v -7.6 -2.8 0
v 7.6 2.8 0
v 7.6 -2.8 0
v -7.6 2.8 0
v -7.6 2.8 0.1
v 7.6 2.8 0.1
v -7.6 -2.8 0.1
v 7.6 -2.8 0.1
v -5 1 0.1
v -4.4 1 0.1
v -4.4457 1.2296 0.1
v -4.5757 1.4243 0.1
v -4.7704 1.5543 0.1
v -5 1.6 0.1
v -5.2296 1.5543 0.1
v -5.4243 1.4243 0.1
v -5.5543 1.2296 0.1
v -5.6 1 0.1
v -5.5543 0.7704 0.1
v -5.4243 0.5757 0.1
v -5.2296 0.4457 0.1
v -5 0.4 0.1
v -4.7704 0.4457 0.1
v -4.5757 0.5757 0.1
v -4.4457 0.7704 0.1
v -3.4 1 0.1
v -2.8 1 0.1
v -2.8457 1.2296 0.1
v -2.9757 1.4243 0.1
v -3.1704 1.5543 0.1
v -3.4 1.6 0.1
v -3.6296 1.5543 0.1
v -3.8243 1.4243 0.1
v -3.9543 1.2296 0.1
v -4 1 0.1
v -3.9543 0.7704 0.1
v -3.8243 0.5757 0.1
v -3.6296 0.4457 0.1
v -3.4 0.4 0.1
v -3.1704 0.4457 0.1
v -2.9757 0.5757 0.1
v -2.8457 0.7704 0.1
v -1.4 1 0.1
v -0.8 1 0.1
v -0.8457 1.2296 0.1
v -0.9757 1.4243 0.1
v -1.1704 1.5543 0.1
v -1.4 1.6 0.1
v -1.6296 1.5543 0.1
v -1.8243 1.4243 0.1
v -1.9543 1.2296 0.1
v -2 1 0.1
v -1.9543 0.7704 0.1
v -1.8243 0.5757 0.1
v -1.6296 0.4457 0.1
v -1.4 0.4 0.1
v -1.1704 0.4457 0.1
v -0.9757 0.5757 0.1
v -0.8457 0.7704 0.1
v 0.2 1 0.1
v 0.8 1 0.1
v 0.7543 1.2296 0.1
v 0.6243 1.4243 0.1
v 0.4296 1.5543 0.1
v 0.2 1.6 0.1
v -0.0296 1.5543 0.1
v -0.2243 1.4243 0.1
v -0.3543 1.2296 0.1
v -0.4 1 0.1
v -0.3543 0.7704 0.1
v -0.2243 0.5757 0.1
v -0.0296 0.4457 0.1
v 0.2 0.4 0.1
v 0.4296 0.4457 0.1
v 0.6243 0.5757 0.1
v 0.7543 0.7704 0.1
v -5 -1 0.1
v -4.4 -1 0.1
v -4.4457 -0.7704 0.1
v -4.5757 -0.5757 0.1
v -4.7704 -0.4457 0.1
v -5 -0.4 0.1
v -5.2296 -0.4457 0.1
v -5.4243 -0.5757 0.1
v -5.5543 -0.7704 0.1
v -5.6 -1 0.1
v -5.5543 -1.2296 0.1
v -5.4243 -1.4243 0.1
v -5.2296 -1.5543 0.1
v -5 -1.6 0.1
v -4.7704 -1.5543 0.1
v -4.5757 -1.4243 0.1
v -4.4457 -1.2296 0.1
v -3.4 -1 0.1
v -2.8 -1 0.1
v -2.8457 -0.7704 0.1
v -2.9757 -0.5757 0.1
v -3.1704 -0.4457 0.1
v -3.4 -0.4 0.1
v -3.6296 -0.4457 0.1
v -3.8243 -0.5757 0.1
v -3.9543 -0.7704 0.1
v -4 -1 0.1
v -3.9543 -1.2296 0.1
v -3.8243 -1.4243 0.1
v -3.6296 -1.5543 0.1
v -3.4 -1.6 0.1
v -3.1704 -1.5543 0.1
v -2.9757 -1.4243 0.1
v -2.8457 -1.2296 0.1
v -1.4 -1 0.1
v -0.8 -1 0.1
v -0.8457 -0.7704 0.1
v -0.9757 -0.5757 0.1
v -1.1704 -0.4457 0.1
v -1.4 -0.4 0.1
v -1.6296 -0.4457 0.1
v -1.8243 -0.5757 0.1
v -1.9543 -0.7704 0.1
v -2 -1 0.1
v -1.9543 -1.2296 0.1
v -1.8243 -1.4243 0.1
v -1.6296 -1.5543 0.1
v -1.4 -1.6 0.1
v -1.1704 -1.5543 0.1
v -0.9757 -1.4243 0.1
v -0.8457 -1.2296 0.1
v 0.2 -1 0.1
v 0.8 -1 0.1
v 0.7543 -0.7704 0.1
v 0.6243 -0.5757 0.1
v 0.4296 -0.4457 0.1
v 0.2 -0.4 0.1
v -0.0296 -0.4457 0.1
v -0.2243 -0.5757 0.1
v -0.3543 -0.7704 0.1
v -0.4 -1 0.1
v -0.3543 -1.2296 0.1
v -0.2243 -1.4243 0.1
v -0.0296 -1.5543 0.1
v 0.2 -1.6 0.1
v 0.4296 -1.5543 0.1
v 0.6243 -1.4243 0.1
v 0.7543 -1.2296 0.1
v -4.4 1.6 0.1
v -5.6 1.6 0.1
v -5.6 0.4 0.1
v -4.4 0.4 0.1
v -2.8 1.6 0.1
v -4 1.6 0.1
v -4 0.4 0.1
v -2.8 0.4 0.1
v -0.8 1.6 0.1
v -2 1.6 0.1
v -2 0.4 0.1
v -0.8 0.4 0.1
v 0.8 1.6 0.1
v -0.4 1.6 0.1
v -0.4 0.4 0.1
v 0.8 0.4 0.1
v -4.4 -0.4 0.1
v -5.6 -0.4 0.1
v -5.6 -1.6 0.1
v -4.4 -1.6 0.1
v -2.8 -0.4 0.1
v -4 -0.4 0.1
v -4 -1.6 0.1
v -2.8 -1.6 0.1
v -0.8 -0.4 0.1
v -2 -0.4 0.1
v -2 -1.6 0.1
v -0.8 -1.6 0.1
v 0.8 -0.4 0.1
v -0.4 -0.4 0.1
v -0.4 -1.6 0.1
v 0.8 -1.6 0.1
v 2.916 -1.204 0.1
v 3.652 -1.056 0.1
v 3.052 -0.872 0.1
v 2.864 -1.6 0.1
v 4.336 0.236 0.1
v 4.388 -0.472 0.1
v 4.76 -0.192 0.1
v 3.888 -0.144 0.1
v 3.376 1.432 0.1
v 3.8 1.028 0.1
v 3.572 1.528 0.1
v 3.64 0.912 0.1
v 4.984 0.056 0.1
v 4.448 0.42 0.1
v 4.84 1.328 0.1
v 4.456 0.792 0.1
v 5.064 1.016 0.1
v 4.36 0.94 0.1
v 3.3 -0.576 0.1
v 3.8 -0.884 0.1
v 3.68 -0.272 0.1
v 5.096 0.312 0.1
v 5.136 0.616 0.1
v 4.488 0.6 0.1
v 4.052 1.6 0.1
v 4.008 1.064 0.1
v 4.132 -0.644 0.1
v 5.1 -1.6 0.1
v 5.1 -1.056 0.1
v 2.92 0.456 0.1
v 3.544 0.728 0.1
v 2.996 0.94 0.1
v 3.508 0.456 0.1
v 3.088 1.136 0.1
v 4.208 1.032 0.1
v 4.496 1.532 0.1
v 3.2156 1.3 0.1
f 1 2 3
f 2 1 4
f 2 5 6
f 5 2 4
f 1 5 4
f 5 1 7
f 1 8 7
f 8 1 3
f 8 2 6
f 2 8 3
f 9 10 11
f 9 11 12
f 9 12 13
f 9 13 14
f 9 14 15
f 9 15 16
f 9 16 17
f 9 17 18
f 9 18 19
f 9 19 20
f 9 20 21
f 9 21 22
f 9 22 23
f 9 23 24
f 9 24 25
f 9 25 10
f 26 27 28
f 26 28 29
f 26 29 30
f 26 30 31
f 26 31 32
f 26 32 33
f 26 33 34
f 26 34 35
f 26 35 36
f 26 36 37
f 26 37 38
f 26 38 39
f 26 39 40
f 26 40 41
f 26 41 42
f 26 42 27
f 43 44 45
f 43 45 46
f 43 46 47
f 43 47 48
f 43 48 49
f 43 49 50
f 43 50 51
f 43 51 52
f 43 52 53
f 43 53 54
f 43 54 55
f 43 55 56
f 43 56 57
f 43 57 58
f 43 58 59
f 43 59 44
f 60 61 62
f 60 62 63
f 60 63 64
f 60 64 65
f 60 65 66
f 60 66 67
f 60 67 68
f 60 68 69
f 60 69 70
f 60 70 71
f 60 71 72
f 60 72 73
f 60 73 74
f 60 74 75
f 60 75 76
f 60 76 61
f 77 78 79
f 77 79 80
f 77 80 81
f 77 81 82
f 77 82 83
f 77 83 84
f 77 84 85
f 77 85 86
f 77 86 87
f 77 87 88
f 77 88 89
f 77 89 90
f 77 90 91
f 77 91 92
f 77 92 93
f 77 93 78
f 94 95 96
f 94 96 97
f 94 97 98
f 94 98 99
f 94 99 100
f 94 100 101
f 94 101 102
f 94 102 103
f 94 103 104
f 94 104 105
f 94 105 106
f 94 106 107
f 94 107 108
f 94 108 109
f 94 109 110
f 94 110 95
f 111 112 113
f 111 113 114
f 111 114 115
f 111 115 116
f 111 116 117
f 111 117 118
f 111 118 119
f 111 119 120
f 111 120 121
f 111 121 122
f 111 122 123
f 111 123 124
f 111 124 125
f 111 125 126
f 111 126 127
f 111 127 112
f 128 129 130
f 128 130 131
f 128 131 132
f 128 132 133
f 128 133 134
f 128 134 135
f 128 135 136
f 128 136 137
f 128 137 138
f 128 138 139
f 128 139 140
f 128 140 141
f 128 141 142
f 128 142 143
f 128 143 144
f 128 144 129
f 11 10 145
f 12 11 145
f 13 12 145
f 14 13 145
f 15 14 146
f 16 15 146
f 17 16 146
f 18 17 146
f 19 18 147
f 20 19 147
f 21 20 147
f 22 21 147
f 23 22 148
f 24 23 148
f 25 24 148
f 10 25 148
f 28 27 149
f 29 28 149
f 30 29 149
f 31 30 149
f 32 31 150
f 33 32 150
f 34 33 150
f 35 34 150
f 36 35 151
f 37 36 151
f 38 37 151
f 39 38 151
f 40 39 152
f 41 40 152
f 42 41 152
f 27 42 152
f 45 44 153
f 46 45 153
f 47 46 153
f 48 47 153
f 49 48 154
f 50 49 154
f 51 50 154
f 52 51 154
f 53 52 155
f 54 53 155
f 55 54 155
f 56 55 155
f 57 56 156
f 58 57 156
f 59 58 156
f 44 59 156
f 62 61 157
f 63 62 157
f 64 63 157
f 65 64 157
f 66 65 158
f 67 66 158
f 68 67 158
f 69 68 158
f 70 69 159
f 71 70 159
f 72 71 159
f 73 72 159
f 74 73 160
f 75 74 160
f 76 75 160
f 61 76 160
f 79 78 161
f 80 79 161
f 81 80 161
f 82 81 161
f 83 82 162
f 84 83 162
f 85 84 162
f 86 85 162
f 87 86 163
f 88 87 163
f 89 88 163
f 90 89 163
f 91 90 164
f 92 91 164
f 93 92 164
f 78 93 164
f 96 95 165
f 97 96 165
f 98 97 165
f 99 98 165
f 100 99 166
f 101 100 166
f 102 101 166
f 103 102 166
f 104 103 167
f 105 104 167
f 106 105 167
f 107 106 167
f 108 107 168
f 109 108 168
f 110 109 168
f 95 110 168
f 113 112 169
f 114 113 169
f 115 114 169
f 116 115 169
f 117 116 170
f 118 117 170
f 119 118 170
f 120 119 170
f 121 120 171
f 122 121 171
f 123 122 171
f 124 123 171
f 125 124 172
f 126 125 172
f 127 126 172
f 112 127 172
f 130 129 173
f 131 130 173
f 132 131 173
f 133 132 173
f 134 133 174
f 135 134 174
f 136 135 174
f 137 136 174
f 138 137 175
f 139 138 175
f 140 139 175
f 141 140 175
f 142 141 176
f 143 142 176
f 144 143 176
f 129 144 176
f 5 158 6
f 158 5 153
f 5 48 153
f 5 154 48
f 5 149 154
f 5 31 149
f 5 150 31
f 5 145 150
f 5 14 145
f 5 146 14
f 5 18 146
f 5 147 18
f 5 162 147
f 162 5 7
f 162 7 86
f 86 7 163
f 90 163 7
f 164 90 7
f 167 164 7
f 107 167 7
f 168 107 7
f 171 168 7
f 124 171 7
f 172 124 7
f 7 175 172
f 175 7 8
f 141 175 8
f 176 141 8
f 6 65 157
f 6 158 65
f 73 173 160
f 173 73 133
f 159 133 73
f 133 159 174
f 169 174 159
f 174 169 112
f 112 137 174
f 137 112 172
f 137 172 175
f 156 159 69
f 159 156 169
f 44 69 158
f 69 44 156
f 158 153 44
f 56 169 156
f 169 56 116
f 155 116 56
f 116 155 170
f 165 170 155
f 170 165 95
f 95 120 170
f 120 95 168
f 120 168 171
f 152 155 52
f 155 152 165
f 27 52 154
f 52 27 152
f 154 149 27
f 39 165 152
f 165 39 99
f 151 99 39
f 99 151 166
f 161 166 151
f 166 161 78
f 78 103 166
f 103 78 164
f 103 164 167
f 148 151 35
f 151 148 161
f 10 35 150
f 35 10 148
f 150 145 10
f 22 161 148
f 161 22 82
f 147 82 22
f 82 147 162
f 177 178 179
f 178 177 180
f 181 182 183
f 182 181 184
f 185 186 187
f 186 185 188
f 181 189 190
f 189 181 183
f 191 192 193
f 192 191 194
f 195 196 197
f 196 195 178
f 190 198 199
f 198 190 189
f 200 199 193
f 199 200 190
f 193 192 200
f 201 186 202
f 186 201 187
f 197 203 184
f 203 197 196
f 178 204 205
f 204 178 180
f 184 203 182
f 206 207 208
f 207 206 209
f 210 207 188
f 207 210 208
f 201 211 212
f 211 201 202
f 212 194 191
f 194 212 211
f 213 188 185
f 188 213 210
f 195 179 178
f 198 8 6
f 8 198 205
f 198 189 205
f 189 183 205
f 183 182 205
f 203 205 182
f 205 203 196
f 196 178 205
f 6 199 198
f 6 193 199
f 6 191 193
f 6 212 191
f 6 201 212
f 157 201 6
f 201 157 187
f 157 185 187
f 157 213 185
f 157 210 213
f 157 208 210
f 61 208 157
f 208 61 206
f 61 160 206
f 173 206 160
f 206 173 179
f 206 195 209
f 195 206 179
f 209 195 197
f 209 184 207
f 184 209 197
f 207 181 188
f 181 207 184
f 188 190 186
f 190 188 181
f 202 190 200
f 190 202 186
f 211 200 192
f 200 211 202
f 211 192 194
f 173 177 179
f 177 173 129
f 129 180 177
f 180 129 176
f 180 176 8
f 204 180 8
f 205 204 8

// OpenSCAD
// file: ../p/box5-12.scad
use <../lib.scad>
function ldraw_lib__box5_12() = [
// 0 Box with 5 Faces without Any Edges
// 0 Name: box5-12.dat
// 0 Author: Chris Dee [cwdee]
// 0 !LDRAW_ORG Primitive UPDATE 2009-02
// 0 !LICENSE Licensed under CC BY 4.0 : see CAreadme.txt
// 
// 0 BFC CERTIFY CCW
  [0,"BFC","CERTIFY"],
  [0,"BFC","CCW"],
// 
// 0 !HISTORY 2009-09-03 [PTadmin] Official Update 2009-02
// 
// 
// 4 16 1 1 1 1 1 -1 -1 1 -1 -1 1 1
  [4,16,1,1,1,1,1,-1,-1,1,-1,-1,1,1],
// 4 16 -1 0 1 1 0 1 1 1 1 -1 1 1
  [4,16,-1,0,1,1,0,1,1,1,1,-1,1,1],
// 4 16 -1 0 -1 -1 0 1 -1 1 1 -1 1 -1
  [4,16,-1,0,-1,-1,0,1,-1,1,1,-1,1,-1],
// 4 16 1 0 -1 -1 0 -1 -1 1 -1 1 1 -1
  [4,16,1,0,-1,-1,0,-1,-1,1,-1,1,1,-1],
// 4 16 1 0 1 1 0 -1 1 1 -1 1 1 1
  [4,16,1,0,1,1,0,-1,1,1,-1,1,1,1],
// 0
];
module ldraw_lib__box5_12(step=0, col=false, unit=2/5, alt=false, line=0.2, solid=!$preview)
    makepoly(ldraw_lib__box5_12(), step=step, col=col, unit=unit, alt=alt, line=line, solid=solid);
ldraw_lib__box5_12(line=0.2);
// file: ../p/4-4ndis.scad
use <../lib.scad>
function ldraw_lib__4_4ndis() = [
// 0 Disc Negative 1.0
// 0 Name: 4-4ndis.dat
// 0 Author: James Jessiman
// 0 !LDRAW_ORG Primitive UPDATE 2012-01
// 0 !LICENSE Licensed under CC BY 4.0 : see CAreadme.txt
// 
// 0 BFC CERTIFY CCW
  [0,"BFC","CERTIFY"],
  [0,"BFC","CCW"],
// 
// 0 !HISTORY 2002-03-23 [sbliss] Added BFC statement; compacted code
// 0 !HISTORY 2002-04-25 [PTadmin] Official Update 2002-02
// 0 !HISTORY 2007-06-24 [PTadmin] Header formatted for Contributor Agreement
// 0 !HISTORY 2008-07-01 [PTadmin] Official Update 2008-01
// 0 !HISTORY 2012-02-16 [Philo] Changed to CCW
// 0 !HISTORY 2012-03-30 [PTadmin] Official Update 2012-01
// 
// 
// 3 16 0.9239 0 0.3827 1 0 0 1 0 1
  [3,16,0.9239,0,0.3827,1,0,0,1,0,1],
// 3 16 0.7071 0 0.7071 0.9239 0 0.3827 1 0 1
  [3,16,0.7071,0,0.7071,0.9239,0,0.3827,1,0,1],
// 3 16 0.3827 0 0.9239 0.7071 0 0.7071 1 0 1
  [3,16,0.3827,0,0.9239,0.7071,0,0.7071,1,0,1],
// 3 16 0 0 1 0.3827 0 0.9239 1 0 1
  [3,16,0,0,1,0.3827,0,0.9239,1,0,1],
// 3 16 -0.3827 0 0.9239 0 0 1 -1 0 1
  [3,16,-0.3827,0,0.9239,0,0,1,-1,0,1],
// 3 16 -0.7071 0 0.7071 -0.3827 0 0.9239 -1 0 1
  [3,16,-0.7071,0,0.7071,-0.3827,0,0.9239,-1,0,1],
// 3 16 -0.9239 0 0.3827 -0.7071 0 0.7071 -1 0 1
  [3,16,-0.9239,0,0.3827,-0.7071,0,0.7071,-1,0,1],
// 3 16 -1 0 0 -0.9239 0 0.3827 -1 0 1
  [3,16,-1,0,0,-0.9239,0,0.3827,-1,0,1],
// 3 16 -0.9239 0 -0.3827 -1 0 0 -1 0 -1
  [3,16,-0.9239,0,-0.3827,-1,0,0,-1,0,-1],
// 3 16 -0.7071 0 -0.7071 -0.9239 0 -0.3827 -1 0 -1
  [3,16,-0.7071,0,-0.7071,-0.9239,0,-0.3827,-1,0,-1],
// 3 16 -0.3827 0 -0.9239 -0.7071 0 -0.7071 -1 0 -1
  [3,16,-0.3827,0,-0.9239,-0.7071,0,-0.7071,-1,0,-1],
// 3 16 0 0 -1 -0.3827 0 -0.9239 -1 0 -1
  [3,16,0,0,-1,-0.3827,0,-0.9239,-1,0,-1],
// 3 16 0.3827 0 -0.9239 0 0 -1 1 0 -1
  [3,16,0.3827,0,-0.9239,0,0,-1,1,0,-1],
// 3 16 0.7071 0 -0.7071 0.3827 0 -0.9239 1 0 -1
  [3,16,0.7071,0,-0.7071,0.3827,0,-0.9239,1,0,-1],
// 3 16 0.9239 0 -0.3827 0.7071 0 -0.7071 1 0 -1
  [3,16,0.9239,0,-0.3827,0.7071,0,-0.7071,1,0,-1],
// 3 16 1 0 0 0.9239 0 -0.3827 1 0 -1
  [3,16,1,0,0,0.9239,0,-0.3827,1,0,-1],
];
module ldraw_lib__4_4ndis(step=0, col=false, unit=2/5, alt=false, line=0.2, solid=!$preview)
    makepoly(ldraw_lib__4_4ndis(), step=step, col=col, unit=unit, alt=alt, line=line, solid=solid);
ldraw_lib__4_4ndis(line=0.2);
// file: ../p/4-4disc.scad
use <../lib.scad>
function ldraw_lib__4_4disc() = [
// 0 Disc 1.0
// 0 Name: 4-4disc.dat
// 0 Author: James Jessiman
// 0 !LDRAW_ORG Primitive UPDATE 2002-02
// 0 !LICENSE Licensed under CC BY 4.0 : see CAreadme.txt
// 
// 0 BFC CERTIFY CCW
  [0,"BFC","CERTIFY"],
  [0,"BFC","CCW"],
// 
// 0 !HISTORY 1998-12-15 [PTadmin] Official Update 1998-10
// 0 !HISTORY 2002-03-23 [sbliss] Added BFC statement
// 0 !HISTORY 2002-04-25 [PTadmin] Official Update 2002-02
// 0 !HISTORY 2007-06-24 [PTadmin] Header formatted for Contributor Agreement
// 0 !HISTORY 2008-07-01 [PTadmin] Official Update 2008-01
// 
// 
// 3 16 0 0 0 1 0 0 0.9239 0 0.3827
  [3,16,0,0,0,1,0,0,0.9239,0,0.3827],
// 3 16 0 0 0 0.9239 0 0.3827 0.7071 0 0.7071
  [3,16,0,0,0,0.9239,0,0.3827,0.7071,0,0.7071],
// 3 16 0 0 0 0.7071 0 0.7071 0.3827 0 0.9239
  [3,16,0,0,0,0.7071,0,0.7071,0.3827,0,0.9239],
// 3 16 0 0 0 0.3827 0 0.9239 0 0 1
  [3,16,0,0,0,0.3827,0,0.9239,0,0,1],
// 3 16 0 0 0 0 0 1 -0.3827 0 0.9239
  [3,16,0,0,0,0,0,1,-0.3827,0,0.9239],
// 3 16 0 0 0 -0.3827 0 0.9239 -0.7071 0 0.7071
  [3,16,0,0,0,-0.3827,0,0.9239,-0.7071,0,0.7071],
// 3 16 0 0 0 -0.7071 0 0.7071 -0.9239 0 0.3827
  [3,16,0,0,0,-0.7071,0,0.7071,-0.9239,0,0.3827],
// 3 16 0 0 0 -0.9239 0 0.3827 -1 0 -0
  [3,16,0,0,0,-0.9239,0,0.3827,-1,0,-0],
// 3 16 0 0 0 -1 0 -0 -0.9239 0 -0.3827
  [3,16,0,0,0,-1,0,-0,-0.9239,0,-0.3827],
// 3 16 0 0 0 -0.9239 0 -0.3827 -0.7071 0 -0.7071
  [3,16,0,0,0,-0.9239,0,-0.3827,-0.7071,0,-0.7071],
// 3 16 0 0 0 -0.7071 0 -0.7071 -0.3827 0 -0.9239
  [3,16,0,0,0,-0.7071,0,-0.7071,-0.3827,0,-0.9239],
// 3 16 0 0 0 -0.3827 0 -0.9239 0 0 -1
  [3,16,0,0,0,-0.3827,0,-0.9239,0,0,-1],
// 3 16 0 0 0 0 0 -1 0.3827 0 -0.9239
  [3,16,0,0,0,0,0,-1,0.3827,0,-0.9239],
// 3 16 0 0 0 0.3827 0 -0.9239 0.7071 0 -0.7071
  [3,16,0,0,0,0.3827,0,-0.9239,0.7071,0,-0.7071],
// 3 16 0 0 0 0.7071 0 -0.7071 0.9239 0 -0.3827
  [3,16,0,0,0,0.7071,0,-0.7071,0.9239,0,-0.3827],
// 3 16 0 0 0 0.9239 0 -0.3827 1 0 0
  [3,16,0,0,0,0.9239,0,-0.3827,1,0,0],
// 0
];
module ldraw_lib__4_4disc(step=0, col=false, unit=2/5, alt=false, line=0.2, solid=!$preview)
    makepoly(ldraw_lib__4_4disc(), step=step, col=col, unit=unit, alt=alt, line=line, solid=solid);
ldraw_lib__4_4disc(line=0.2);
// main file
use <../lib.scad>
use <../p/4-4disc.scad>
use <../p/4-4ndis.scad>
use <../p/box5-12.scad>
function ldraw_lib__195555e() = [
// 0 Sticker  0.7 x  1.9 with White Dots and Number 2 on Black Background
// 0 Name: 195555e.dat
// 0 Author: Takeshi Takahashi [RainbowDolphin]
// 0 !LDRAW_ORG Part UPDATE 2025-03
// 0 !LICENSE Licensed under CC BY 4.0 : see CAreadme.txt
// 
// 0 BFC CERTIFY CCW
  [0,"BFC","CERTIFY"],
  [0,"BFC","CCW"],
// 
// 0 !KEYWORDS Bricklink 6371stk01, Brickowl 584391, Gas pump, Rebrickable 195555
// 0 !KEYWORDS Service station, Set 6371
// 
// 0 !HISTORY 2025-03-30 [OrionP] Official Update 2025-03
// 
// 
// 1 16 0 -0.25 0 19 0 0 0 0.25 0 0 0 7 box5-12.dat
  [1,16,0,-0.25,0,19,0,0,0,0.25,0,0,0,7, ldraw_lib__box5_12()],
// 1 15 -12.5 -0.25 2.5 1.5 0 0 0 1 0 0 0 1.5 4-4disc.dat
  [1,15,-12.5,-0.25,2.5,1.5,0,0,0,1,0,0,0,1.5, ldraw_lib__4_4disc()],
// 1 15 -8.5 -0.25 2.5 1.5 0 0 0 1 0 0 0 1.5 4-4disc.dat
  [1,15,-8.5,-0.25,2.5,1.5,0,0,0,1,0,0,0,1.5, ldraw_lib__4_4disc()],
// 1 15 -3.5 -0.25 2.5 1.5 0 0 0 1 0 0 0 1.5 4-4disc.dat
  [1,15,-3.5,-0.25,2.5,1.5,0,0,0,1,0,0,0,1.5, ldraw_lib__4_4disc()],
// 1 15 0.5 -0.25 2.5 1.5 0 0 0 1 0 0 0 1.5 4-4disc.dat
  [1,15,0.5,-0.25,2.5,1.5,0,0,0,1,0,0,0,1.5, ldraw_lib__4_4disc()],
// 1 15 -12.5 -0.25 -2.5 1.5 0 0 0 1 0 0 0 1.5 4-4disc.dat
  [1,15,-12.5,-0.25,-2.5,1.5,0,0,0,1,0,0,0,1.5, ldraw_lib__4_4disc()],
// 1 15 -8.5 -0.25 -2.5 1.5 0 0 0 1 0 0 0 1.5 4-4disc.dat
  [1,15,-8.5,-0.25,-2.5,1.5,0,0,0,1,0,0,0,1.5, ldraw_lib__4_4disc()],
// 1 15 -3.5 -0.25 -2.5 1.5 0 0 0 1 0 0 0 1.5 4-4disc.dat
  [1,15,-3.5,-0.25,-2.5,1.5,0,0,0,1,0,0,0,1.5, ldraw_lib__4_4disc()],
// 1 15 0.5 -0.25 -2.5 1.5 0 0 0 1 0 0 0 1.5 4-4disc.dat
  [1,15,0.5,-0.25,-2.5,1.5,0,0,0,1,0,0,0,1.5, ldraw_lib__4_4disc()],
// 1 0 -12.5 -0.25 2.5 1.5 0 0 0 1 0 0 0 1.5 4-4ndis.dat
  [1,0,-12.5,-0.25,2.5,1.5,0,0,0,1,0,0,0,1.5, ldraw_lib__4_4ndis()],
// 1 0 -8.5 -0.25 2.5 1.5 0 0 0 1 0 0 0 1.5 4-4ndis.dat
  [1,0,-8.5,-0.25,2.5,1.5,0,0,0,1,0,0,0,1.5, ldraw_lib__4_4ndis()],
// 1 0 -3.5 -0.25 2.5 1.5 0 0 0 1 0 0 0 1.5 4-4ndis.dat
  [1,0,-3.5,-0.25,2.5,1.5,0,0,0,1,0,0,0,1.5, ldraw_lib__4_4ndis()],
// 1 0 0.5 -0.25 2.5 1.5 0 0 0 1 0 0 0 1.5 4-4ndis.dat
  [1,0,0.5,-0.25,2.5,1.5,0,0,0,1,0,0,0,1.5, ldraw_lib__4_4ndis()],
// 1 0 -12.5 -0.25 -2.5 1.5 0 0 0 1 0 0 0 1.5 4-4ndis.dat
  [1,0,-12.5,-0.25,-2.5,1.5,0,0,0,1,0,0,0,1.5, ldraw_lib__4_4ndis()],
// 1 0 -8.5 -0.25 -2.5 1.5 0 0 0 1 0 0 0 1.5 4-4ndis.dat
  [1,0,-8.5,-0.25,-2.5,1.5,0,0,0,1,0,0,0,1.5, ldraw_lib__4_4ndis()],
// 1 0 -3.5 -0.25 -2.5 1.5 0 0 0 1 0 0 0 1.5 4-4ndis.dat
  [1,0,-3.5,-0.25,-2.5,1.5,0,0,0,1,0,0,0,1.5, ldraw_lib__4_4ndis()],
// 1 0 0.5 -0.25 -2.5 1.5 0 0 0 1 0 0 0 1.5 4-4ndis.dat
  [1,0,0.5,-0.25,-2.5,1.5,0,0,0,1,0,0,0,1.5, ldraw_lib__4_4ndis()],
// 4 0 -1 -0.25 4 19 -0.25 7 -19 -0.25 7 -2 -0.25 4
  [4,0,-1,-0.25,4,19,-0.25,7,-19,-0.25,7,-2,-0.25,4],
// 3 0 -19 -0.25 7 -3.5 -0.25 4 -2 -0.25 4
  [3,0,-19,-0.25,7,-3.5,-0.25,4,-2,-0.25,4],
// 3 0 -19 -0.25 7 -5 -0.25 4 -3.5 -0.25 4
  [3,0,-19,-0.25,7,-5,-0.25,4,-3.5,-0.25,4],
// 3 0 -19 -0.25 7 -7 -0.25 4 -5 -0.25 4
  [3,0,-19,-0.25,7,-7,-0.25,4,-5,-0.25,4],
// 3 0 -19 -0.25 7 -8.5 -0.25 4 -7 -0.25 4
  [3,0,-19,-0.25,7,-8.5,-0.25,4,-7,-0.25,4],
// 3 0 -19 -0.25 7 -10 -0.25 4 -8.5 -0.25 4
  [3,0,-19,-0.25,7,-10,-0.25,4,-8.5,-0.25,4],
// 3 0 -19 -0.25 7 -11 -0.25 4 -10 -0.25 4
  [3,0,-19,-0.25,7,-11,-0.25,4,-10,-0.25,4],
// 3 0 -19 -0.25 7 -12.5 -0.25 4 -11 -0.25 4
  [3,0,-19,-0.25,7,-12.5,-0.25,4,-11,-0.25,4],
// 3 0 -19 -0.25 7 -14 -0.25 4 -12.5 -0.25 4
  [3,0,-19,-0.25,7,-14,-0.25,4,-12.5,-0.25,4],
// 3 0 -19 -0.25 7 -14 -0.25 2.5 -14 -0.25 4
  [3,0,-19,-0.25,7,-14,-0.25,2.5,-14,-0.25,4],
// 3 0 -19 -0.25 7 -14 -0.25 1 -14 -0.25 2.5
  [3,0,-19,-0.25,7,-14,-0.25,1,-14,-0.25,2.5],
// 4 0 -14 -0.25 -1 -14 -0.25 1 -19 -0.25 7 -19 -0.25 -7
  [4,0,-14,-0.25,-1,-14,-0.25,1,-19,-0.25,7,-19,-0.25,-7],
// 3 0 -14 -0.25 -1 -19 -0.25 -7 -14 -0.25 -2.5
  [3,0,-14,-0.25,-1,-19,-0.25,-7,-14,-0.25,-2.5],
// 3 0 -14 -0.25 -2.5 -19 -0.25 -7 -14 -0.25 -4
  [3,0,-14,-0.25,-2.5,-19,-0.25,-7,-14,-0.25,-4],
// 3 0 -12.5 -0.25 -4 -14 -0.25 -4 -19 -0.25 -7
  [3,0,-12.5,-0.25,-4,-14,-0.25,-4,-19,-0.25,-7],
// 3 0 -11 -0.25 -4 -12.5 -0.25 -4 -19 -0.25 -7
  [3,0,-11,-0.25,-4,-12.5,-0.25,-4,-19,-0.25,-7],
// 3 0 -10 -0.25 -4 -11 -0.25 -4 -19 -0.25 -7
  [3,0,-10,-0.25,-4,-11,-0.25,-4,-19,-0.25,-7],
// 3 0 -8.5 -0.25 -4 -10 -0.25 -4 -19 -0.25 -7
  [3,0,-8.5,-0.25,-4,-10,-0.25,-4,-19,-0.25,-7],
// 3 0 -7 -0.25 -4 -8.5 -0.25 -4 -19 -0.25 -7
  [3,0,-7,-0.25,-4,-8.5,-0.25,-4,-19,-0.25,-7],
// 3 0 -5 -0.25 -4 -7 -0.25 -4 -19 -0.25 -7
  [3,0,-5,-0.25,-4,-7,-0.25,-4,-19,-0.25,-7],
// 3 0 -3.5 -0.25 -4 -5 -0.25 -4 -19 -0.25 -7
  [3,0,-3.5,-0.25,-4,-5,-0.25,-4,-19,-0.25,-7],
// 3 0 -2 -0.25 -4 -3.5 -0.25 -4 -19 -0.25 -7
  [3,0,-2,-0.25,-4,-3.5,-0.25,-4,-19,-0.25,-7],
// 4 0 -1 -0.25 -4 -2 -0.25 -4 -19 -0.25 -7 19 -0.25 -7
  [4,0,-1,-0.25,-4,-2,-0.25,-4,-19,-0.25,-7,19,-0.25,-7],
// 3 0 0.5 -0.25 -4 -1 -0.25 -4 19 -0.25 -7
  [3,0,0.5,-0.25,-4,-1,-0.25,-4,19,-0.25,-7],
// 3 0 2 -0.25 -4 0.5 -0.25 -4 19 -0.25 -7
  [3,0,2,-0.25,-4,0.5,-0.25,-4,19,-0.25,-7],
// 3 0 19 -0.25 7 0.5 -0.25 4 2 -0.25 4
  [3,0,19,-0.25,7,0.5,-0.25,4,2,-0.25,4],
// 3 0 19 -0.25 7 -1 -0.25 4 0.5 -0.25 4
  [3,0,19,-0.25,7,-1,-0.25,4,0.5,-0.25,4],
// 4 0 0.5 -0.25 -1 2 -0.25 -1 2 -0.25 1 0.5 -0.25 1
  [4,0,0.5,-0.25,-1,2,-0.25,-1,2,-0.25,1,0.5,-0.25,1],
// 4 0 -1 -0.25 -1 0.5 -0.25 -1 0.5 -0.25 1 -1 -0.25 1
  [4,0,-1,-0.25,-1,0.5,-0.25,-1,0.5,-0.25,1,-1,-0.25,1],
// 4 0 -1 -0.25 -1 -1 -0.25 1 -2 -0.25 -1 -2 -0.25 -2.5
  [4,0,-1,-0.25,-1,-1,-0.25,1,-2,-0.25,-1,-2,-0.25,-2.5],
// 4 0 -1 -0.25 -2.5 -1 -0.25 -1 -2 -0.25 -2.5 -2 -0.25 -4
  [4,0,-1,-0.25,-2.5,-1,-0.25,-1,-2,-0.25,-2.5,-2,-0.25,-4],
// 3 0 -1 -0.25 -2.5 -2 -0.25 -4 -1 -0.25 -4
  [3,0,-1,-0.25,-2.5,-2,-0.25,-4,-1,-0.25,-4],
// 4 0 -2 -0.25 1 -2 -0.25 -1 -1 -0.25 1 -1 -0.25 2.5
  [4,0,-2,-0.25,1,-2,-0.25,-1,-1,-0.25,1,-1,-0.25,2.5],
// 4 0 -2 -0.25 2.5 -2 -0.25 1 -1 -0.25 2.5 -1 -0.25 4
  [4,0,-2,-0.25,2.5,-2,-0.25,1,-1,-0.25,2.5,-1,-0.25,4],
// 3 0 -1 -0.25 4 -2 -0.25 4 -2 -0.25 2.5
  [3,0,-1,-0.25,4,-2,-0.25,4,-2,-0.25,2.5],
// 4 0 -3.5 -0.25 -1 -2 -0.25 -1 -2 -0.25 1 -3.5 -0.25 1
  [4,0,-3.5,-0.25,-1,-2,-0.25,-1,-2,-0.25,1,-3.5,-0.25,1],
// 4 0 -5 -0.25 -1 -3.5 -0.25 -1 -3.5 -0.25 1 -5 -0.25 1
  [4,0,-5,-0.25,-1,-3.5,-0.25,-1,-3.5,-0.25,1,-5,-0.25,1],
// 4 0 -5 -0.25 -1 -5 -0.25 1 -7 -0.25 -1 -7 -0.25 -2.5
  [4,0,-5,-0.25,-1,-5,-0.25,1,-7,-0.25,-1,-7,-0.25,-2.5],
// 4 0 -5 -0.25 -2.5 -5 -0.25 -1 -7 -0.25 -2.5 -7 -0.25 -4
  [4,0,-5,-0.25,-2.5,-5,-0.25,-1,-7,-0.25,-2.5,-7,-0.25,-4],
// 3 0 -5 -0.25 -2.5 -7 -0.25 -4 -5 -0.25 -4
  [3,0,-5,-0.25,-2.5,-7,-0.25,-4,-5,-0.25,-4],
// 4 0 -7 -0.25 1 -7 -0.25 -1 -5 -0.25 1 -5 -0.25 2.5
  [4,0,-7,-0.25,1,-7,-0.25,-1,-5,-0.25,1,-5,-0.25,2.5],
// 4 0 -7 -0.25 2.5 -7 -0.25 1 -5 -0.25 2.5 -5 -0.25 4
  [4,0,-7,-0.25,2.5,-7,-0.25,1,-5,-0.25,2.5,-5,-0.25,4],
// 3 0 -5 -0.25 4 -7 -0.25 4 -7 -0.25 2.5
  [3,0,-5,-0.25,4,-7,-0.25,4,-7,-0.25,2.5],
// 4 0 -8.5 -0.25 -1 -7 -0.25 -1 -7 -0.25 1 -8.5 -0.25 1
  [4,0,-8.5,-0.25,-1,-7,-0.25,-1,-7,-0.25,1,-8.5,-0.25,1],
// 4 0 -10 -0.25 -1 -8.5 -0.25 -1 -8.5 -0.25 1 -10 -0.25 1
  [4,0,-10,-0.25,-1,-8.5,-0.25,-1,-8.5,-0.25,1,-10,-0.25,1],
// 4 0 -10 -0.25 -1 -10 -0.25 1 -11 -0.25 -1 -11 -0.25 -2.5
  [4,0,-10,-0.25,-1,-10,-0.25,1,-11,-0.25,-1,-11,-0.25,-2.5],
// 4 0 -10 -0.25 -2.5 -10 -0.25 -1 -11 -0.25 -2.5 -11 -0.25 -4
  [4,0,-10,-0.25,-2.5,-10,-0.25,-1,-11,-0.25,-2.5,-11,-0.25,-4],
// 3 0 -10 -0.25 -2.5 -11 -0.25 -4 -10 -0.25 -4
  [3,0,-10,-0.25,-2.5,-11,-0.25,-4,-10,-0.25,-4],
// 4 0 -11 -0.25 1 -11 -0.25 -1 -10 -0.25 1 -10 -0.25 2.5
  [4,0,-11,-0.25,1,-11,-0.25,-1,-10,-0.25,1,-10,-0.25,2.5],
// 4 0 -11 -0.25 2.5 -11 -0.25 1 -10 -0.25 2.5 -10 -0.25 4
  [4,0,-11,-0.25,2.5,-11,-0.25,1,-10,-0.25,2.5,-10,-0.25,4],
// 3 0 -10 -0.25 4 -11 -0.25 4 -11 -0.25 2.5
  [3,0,-10,-0.25,4,-11,-0.25,4,-11,-0.25,2.5],
// 4 0 -12.5 -0.25 -1 -11 -0.25 -1 -11 -0.25 1 -12.5 -0.25 1
  [4,0,-12.5,-0.25,-1,-11,-0.25,-1,-11,-0.25,1,-12.5,-0.25,1],
// 4 0 -14 -0.25 -1 -12.5 -0.25 -1 -12.5 -0.25 1 -14 -0.25 1
  [4,0,-14,-0.25,-1,-12.5,-0.25,-1,-12.5,-0.25,1,-14,-0.25,1],
// 4 15 7.63 -0.25 -2.18 7.29 -0.25 -3.01 7.16 -0.25 -4 9.13 -0.25 -2.64
  [4,15,7.63,-0.25,-2.18,7.29,-0.25,-3.01,7.16,-0.25,-4,9.13,-0.25,-2.64],
// 4 15 9.72 -0.25 -0.36 10.97 -0.25 -1.18 11.9 -0.25 -0.48 10.84 -0.25 0.59
  [4,15,9.72,-0.25,-0.36,10.97,-0.25,-1.18,11.9,-0.25,-0.48,10.84,-0.25,0.59],
// 4 15 8.93 -0.25 3.82 8.44 -0.25 3.58 9.1 -0.25 2.28 9.5 -0.25 2.57
  [4,15,8.93,-0.25,3.82,8.44,-0.25,3.58,9.1,-0.25,2.28,9.5,-0.25,2.57],
// 4 15 11.9 -0.25 -0.48 12.46 -0.25 0.14 11.12 -0.25 1.05 10.84 -0.25 0.59
  [4,15,11.9,-0.25,-0.48,12.46,-0.25,0.14,11.12,-0.25,1.05,10.84,-0.25,0.59],
// 4 15 10.9 -0.25 2.35 11.14 -0.25 1.98 12.66 -0.25 2.54 12.1 -0.25 3.32
  [4,15,10.9,-0.25,2.35,11.14,-0.25,1.98,12.66,-0.25,2.54,12.1,-0.25,3.32],
// 4 15 9.2 -0.25 -0.68 8.25 -0.25 -1.44 9.13 -0.25 -2.64 9.5 -0.25 -2.21
  [4,15,9.2,-0.25,-0.68,8.25,-0.25,-1.44,9.13,-0.25,-2.64,9.5,-0.25,-2.21],
// 4 15 11.12 -0.25 1.05 12.46 -0.25 0.14 12.74 -0.25 0.78 12.84 -0.25 1.54
  [4,15,11.12,-0.25,1.05,12.46,-0.25,0.14,12.74,-0.25,0.78,12.84,-0.25,1.54],
// 4 15 11.22 -0.25 1.5 11.12 -0.25 1.05 12.84 -0.25 1.54 12.66 -0.25 2.54
  [4,15,11.22,-0.25,1.5,11.12,-0.25,1.05,12.84,-0.25,1.54,12.66,-0.25,2.54],
// 3 15 12.66 -0.25 2.54 11.14 -0.25 1.98 11.22 -0.25 1.5
  [3,15,12.66,-0.25,2.54,11.14,-0.25,1.98,11.22,-0.25,1.5],
// 4 15 10.02 -0.25 2.66 10.13 -0.25 4 8.93 -0.25 3.82 9.5 -0.25 2.57
  [4,15,10.02,-0.25,2.66,10.13,-0.25,4,8.93,-0.25,3.82,9.5,-0.25,2.57],
// 4 15 9.72 -0.25 -0.36 9.2 -0.25 -0.68 9.5 -0.25 -2.21 10.33 -0.25 -1.61
  [4,15,9.72,-0.25,-0.36,9.2,-0.25,-0.68,9.5,-0.25,-2.21,10.33,-0.25,-1.61],
// 4 15 9.13 -0.25 -2.64 7.16 -0.25 -4 12.75 -0.25 -4 12.75 -0.25 -2.64
  [4,15,9.13,-0.25,-2.64,7.16,-0.25,-4,12.75,-0.25,-4,12.75,-0.25,-2.64],
// 3 15 9.72 -0.25 -0.36 10.33 -0.25 -1.61 10.97 -0.25 -1.18
  [3,15,9.72,-0.25,-0.36,10.33,-0.25,-1.61,10.97,-0.25,-1.18],
// 4 15 7.49 -0.25 2.35 7.3 -0.25 1.14 8.77 -0.25 1.14 8.86 -0.25 1.82
  [4,15,7.49,-0.25,2.35,7.3,-0.25,1.14,8.77,-0.25,1.14,8.86,-0.25,1.82],
// 4 15 9.1 -0.25 2.28 7.72 -0.25 2.84 7.49 -0.25 2.35 8.86 -0.25 1.82
  [4,15,9.1,-0.25,2.28,7.72,-0.25,2.84,7.49,-0.25,2.35,8.86,-0.25,1.82],
// 4 15 10.02 -0.25 2.66 10.52 -0.25 2.58 11.24 -0.25 3.83 10.13 -0.25 4
  [4,15,10.02,-0.25,2.66,10.52,-0.25,2.58,11.24,-0.25,3.83,10.13,-0.25,4],
// 4 15 12.1 -0.25 3.32 11.24 -0.25 3.83 10.52 -0.25 2.58 10.9 -0.25 2.35
  [4,15,12.1,-0.25,3.32,11.24,-0.25,3.83,10.52,-0.25,2.58,10.9,-0.25,2.35],
// 4 15 7.72 -0.25 2.84 9.1 -0.25 2.28 8.44 -0.25 3.58 8.039 -0.25 3.25
  [4,15,7.72,-0.25,2.84,9.1,-0.25,2.28,8.44,-0.25,3.58,8.039,-0.25,3.25],
// 3 15 8.25 -0.25 -1.44 7.63 -0.25 -2.18 9.13 -0.25 -2.64
  [3,15,8.25,-0.25,-1.44,7.63,-0.25,-2.18,9.13,-0.25,-2.64],
// 4 0 12.75 -0.25 -2.64 19 -0.25 -7 19 -0.25 7 12.74 -0.25 0.78
  [4,0,12.75,-0.25,-2.64,19,-0.25,-7,19,-0.25,7,12.74,-0.25,0.78],
// 3 0 12.74 -0.25 0.78 12.46 -0.25 0.14 12.75 -0.25 -2.64
  [3,0,12.74,-0.25,0.78,12.46,-0.25,0.14,12.75,-0.25,-2.64],
// 3 0 12.46 -0.25 0.14 11.9 -0.25 -0.48 12.75 -0.25 -2.64
  [3,0,12.46,-0.25,0.14,11.9,-0.25,-0.48,12.75,-0.25,-2.64],
// 3 0 11.9 -0.25 -0.48 10.97 -0.25 -1.18 12.75 -0.25 -2.64
  [3,0,11.9,-0.25,-0.48,10.97,-0.25,-1.18,12.75,-0.25,-2.64],
// 4 0 12.75 -0.25 -2.64 10.97 -0.25 -1.18 10.33 -0.25 -1.61 9.5 -0.25 -2.21
  [4,0,12.75,-0.25,-2.64,10.97,-0.25,-1.18,10.33,-0.25,-1.61,9.5,-0.25,-2.21],
// 3 0 9.5 -0.25 -2.21 9.13 -0.25 -2.64 12.75 -0.25 -2.64
  [3,0,9.5,-0.25,-2.21,9.13,-0.25,-2.64,12.75,-0.25,-2.64],
// 3 0 19 -0.25 7 12.84 -0.25 1.54 12.74 -0.25 0.78
  [3,0,19,-0.25,7,12.84,-0.25,1.54,12.74,-0.25,0.78],
// 3 0 19 -0.25 7 12.66 -0.25 2.54 12.84 -0.25 1.54
  [3,0,19,-0.25,7,12.66,-0.25,2.54,12.84,-0.25,1.54],
// 3 0 19 -0.25 7 12.1 -0.25 3.32 12.66 -0.25 2.54
  [3,0,19,-0.25,7,12.1,-0.25,3.32,12.66,-0.25,2.54],
// 3 0 19 -0.25 7 11.24 -0.25 3.83 12.1 -0.25 3.32
  [3,0,19,-0.25,7,11.24,-0.25,3.83,12.1,-0.25,3.32],
// 3 0 19 -0.25 7 10.13 -0.25 4 11.24 -0.25 3.83
  [3,0,19,-0.25,7,10.13,-0.25,4,11.24,-0.25,3.83],
// 4 0 10.13 -0.25 4 19 -0.25 7 2 -0.25 4 8.93 -0.25 3.82
  [4,0,10.13,-0.25,4,19,-0.25,7,2,-0.25,4,8.93,-0.25,3.82],
// 3 0 2 -0.25 4 8.44 -0.25 3.58 8.93 -0.25 3.82
  [3,0,2,-0.25,4,8.44,-0.25,3.58,8.93,-0.25,3.82],
// 3 0 2 -0.25 4 8.039 -0.25 3.25 8.44 -0.25 3.58
  [3,0,2,-0.25,4,8.039,-0.25,3.25,8.44,-0.25,3.58],
// 3 0 2 -0.25 4 7.72 -0.25 2.84 8.039 -0.25 3.25
  [3,0,2,-0.25,4,7.72,-0.25,2.84,8.039,-0.25,3.25],
// 3 0 2 -0.25 4 7.49 -0.25 2.35 7.72 -0.25 2.84
  [3,0,2,-0.25,4,7.49,-0.25,2.35,7.72,-0.25,2.84],
// 4 0 7.3 -0.25 1.14 7.49 -0.25 2.35 2 -0.25 4 2 -0.25 2.5
  [4,0,7.3,-0.25,1.14,7.49,-0.25,2.35,2,-0.25,4,2,-0.25,2.5],
// 3 0 2 -0.25 2.5 2 -0.25 1 7.3 -0.25 1.14
  [3,0,2,-0.25,2.5,2,-0.25,1,7.3,-0.25,1.14],
// 4 0 7.3 -0.25 1.14 2 -0.25 1 2 -0.25 -1 7.63 -0.25 -2.18
  [4,0,7.3,-0.25,1.14,2,-0.25,1,2,-0.25,-1,7.63,-0.25,-2.18],
// 4 0 7.3 -0.25 1.14 7.63 -0.25 -2.18 8.25 -0.25 -1.44 8.77 -0.25 1.14
  [4,0,7.3,-0.25,1.14,7.63,-0.25,-2.18,8.25,-0.25,-1.44,8.77,-0.25,1.14],
// 3 0 8.77 -0.25 1.14 8.25 -0.25 -1.44 9.2 -0.25 -0.68
  [3,0,8.77,-0.25,1.14,8.25,-0.25,-1.44,9.2,-0.25,-0.68],
// 4 0 8.77 -0.25 1.14 9.2 -0.25 -0.68 9.72 -0.25 -0.36 8.86 -0.25 1.82
  [4,0,8.77,-0.25,1.14,9.2,-0.25,-0.68,9.72,-0.25,-0.36,8.86,-0.25,1.82],
// 4 0 8.86 -0.25 1.82 9.72 -0.25 -0.36 10.84 -0.25 0.59 9.1 -0.25 2.28
  [4,0,8.86,-0.25,1.82,9.72,-0.25,-0.36,10.84,-0.25,0.59,9.1,-0.25,2.28],
// 4 0 9.1 -0.25 2.28 10.84 -0.25 0.59 11.12 -0.25 1.05 9.5 -0.25 2.57
  [4,0,9.1,-0.25,2.28,10.84,-0.25,0.59,11.12,-0.25,1.05,9.5,-0.25,2.57],
// 4 0 9.5 -0.25 2.57 11.12 -0.25 1.05 11.22 -0.25 1.5 10.02 -0.25 2.66
  [4,0,9.5,-0.25,2.57,11.12,-0.25,1.05,11.22,-0.25,1.5,10.02,-0.25,2.66],
// 4 0 10.02 -0.25 2.66 11.22 -0.25 1.5 11.14 -0.25 1.98 10.52 -0.25 2.58
  [4,0,10.02,-0.25,2.66,11.22,-0.25,1.5,11.14,-0.25,1.98,10.52,-0.25,2.58],
// 3 0 10.52 -0.25 2.58 11.14 -0.25 1.98 10.9 -0.25 2.35
  [3,0,10.52,-0.25,2.58,11.14,-0.25,1.98,10.9,-0.25,2.35],
// 4 0 7.29 -0.25 -3.01 7.63 -0.25 -2.18 2 -0.25 -1 2 -0.25 -2.5
  [4,0,7.29,-0.25,-3.01,7.63,-0.25,-2.18,2,-0.25,-1,2,-0.25,-2.5],
// 4 0 7.29 -0.25 -3.01 2 -0.25 -2.5 2 -0.25 -4 7.16 -0.25 -4
  [4,0,7.29,-0.25,-3.01,2,-0.25,-2.5,2,-0.25,-4,7.16,-0.25,-4],
// 3 0 7.16 -0.25 -4 2 -0.25 -4 19 -0.25 -7
  [3,0,7.16,-0.25,-4,2,-0.25,-4,19,-0.25,-7],
// 3 0 12.75 -0.25 -4 7.16 -0.25 -4 19 -0.25 -7
  [3,0,12.75,-0.25,-4,7.16,-0.25,-4,19,-0.25,-7],
// 3 0 12.75 -0.25 -2.64 12.75 -0.25 -4 19 -0.25 -7
  [3,0,12.75,-0.25,-2.64,12.75,-0.25,-4,19,-0.25,-7],
];
module ldraw_lib__195555e(step=0, col=false, unit=2/5, alt=false, line=0.2, solid=!$preview)
    makepoly(ldraw_lib__195555e(), step=step, col=col, unit=unit, alt=alt, line=line, solid=solid);
ldraw_lib__195555e(line=0.2);
